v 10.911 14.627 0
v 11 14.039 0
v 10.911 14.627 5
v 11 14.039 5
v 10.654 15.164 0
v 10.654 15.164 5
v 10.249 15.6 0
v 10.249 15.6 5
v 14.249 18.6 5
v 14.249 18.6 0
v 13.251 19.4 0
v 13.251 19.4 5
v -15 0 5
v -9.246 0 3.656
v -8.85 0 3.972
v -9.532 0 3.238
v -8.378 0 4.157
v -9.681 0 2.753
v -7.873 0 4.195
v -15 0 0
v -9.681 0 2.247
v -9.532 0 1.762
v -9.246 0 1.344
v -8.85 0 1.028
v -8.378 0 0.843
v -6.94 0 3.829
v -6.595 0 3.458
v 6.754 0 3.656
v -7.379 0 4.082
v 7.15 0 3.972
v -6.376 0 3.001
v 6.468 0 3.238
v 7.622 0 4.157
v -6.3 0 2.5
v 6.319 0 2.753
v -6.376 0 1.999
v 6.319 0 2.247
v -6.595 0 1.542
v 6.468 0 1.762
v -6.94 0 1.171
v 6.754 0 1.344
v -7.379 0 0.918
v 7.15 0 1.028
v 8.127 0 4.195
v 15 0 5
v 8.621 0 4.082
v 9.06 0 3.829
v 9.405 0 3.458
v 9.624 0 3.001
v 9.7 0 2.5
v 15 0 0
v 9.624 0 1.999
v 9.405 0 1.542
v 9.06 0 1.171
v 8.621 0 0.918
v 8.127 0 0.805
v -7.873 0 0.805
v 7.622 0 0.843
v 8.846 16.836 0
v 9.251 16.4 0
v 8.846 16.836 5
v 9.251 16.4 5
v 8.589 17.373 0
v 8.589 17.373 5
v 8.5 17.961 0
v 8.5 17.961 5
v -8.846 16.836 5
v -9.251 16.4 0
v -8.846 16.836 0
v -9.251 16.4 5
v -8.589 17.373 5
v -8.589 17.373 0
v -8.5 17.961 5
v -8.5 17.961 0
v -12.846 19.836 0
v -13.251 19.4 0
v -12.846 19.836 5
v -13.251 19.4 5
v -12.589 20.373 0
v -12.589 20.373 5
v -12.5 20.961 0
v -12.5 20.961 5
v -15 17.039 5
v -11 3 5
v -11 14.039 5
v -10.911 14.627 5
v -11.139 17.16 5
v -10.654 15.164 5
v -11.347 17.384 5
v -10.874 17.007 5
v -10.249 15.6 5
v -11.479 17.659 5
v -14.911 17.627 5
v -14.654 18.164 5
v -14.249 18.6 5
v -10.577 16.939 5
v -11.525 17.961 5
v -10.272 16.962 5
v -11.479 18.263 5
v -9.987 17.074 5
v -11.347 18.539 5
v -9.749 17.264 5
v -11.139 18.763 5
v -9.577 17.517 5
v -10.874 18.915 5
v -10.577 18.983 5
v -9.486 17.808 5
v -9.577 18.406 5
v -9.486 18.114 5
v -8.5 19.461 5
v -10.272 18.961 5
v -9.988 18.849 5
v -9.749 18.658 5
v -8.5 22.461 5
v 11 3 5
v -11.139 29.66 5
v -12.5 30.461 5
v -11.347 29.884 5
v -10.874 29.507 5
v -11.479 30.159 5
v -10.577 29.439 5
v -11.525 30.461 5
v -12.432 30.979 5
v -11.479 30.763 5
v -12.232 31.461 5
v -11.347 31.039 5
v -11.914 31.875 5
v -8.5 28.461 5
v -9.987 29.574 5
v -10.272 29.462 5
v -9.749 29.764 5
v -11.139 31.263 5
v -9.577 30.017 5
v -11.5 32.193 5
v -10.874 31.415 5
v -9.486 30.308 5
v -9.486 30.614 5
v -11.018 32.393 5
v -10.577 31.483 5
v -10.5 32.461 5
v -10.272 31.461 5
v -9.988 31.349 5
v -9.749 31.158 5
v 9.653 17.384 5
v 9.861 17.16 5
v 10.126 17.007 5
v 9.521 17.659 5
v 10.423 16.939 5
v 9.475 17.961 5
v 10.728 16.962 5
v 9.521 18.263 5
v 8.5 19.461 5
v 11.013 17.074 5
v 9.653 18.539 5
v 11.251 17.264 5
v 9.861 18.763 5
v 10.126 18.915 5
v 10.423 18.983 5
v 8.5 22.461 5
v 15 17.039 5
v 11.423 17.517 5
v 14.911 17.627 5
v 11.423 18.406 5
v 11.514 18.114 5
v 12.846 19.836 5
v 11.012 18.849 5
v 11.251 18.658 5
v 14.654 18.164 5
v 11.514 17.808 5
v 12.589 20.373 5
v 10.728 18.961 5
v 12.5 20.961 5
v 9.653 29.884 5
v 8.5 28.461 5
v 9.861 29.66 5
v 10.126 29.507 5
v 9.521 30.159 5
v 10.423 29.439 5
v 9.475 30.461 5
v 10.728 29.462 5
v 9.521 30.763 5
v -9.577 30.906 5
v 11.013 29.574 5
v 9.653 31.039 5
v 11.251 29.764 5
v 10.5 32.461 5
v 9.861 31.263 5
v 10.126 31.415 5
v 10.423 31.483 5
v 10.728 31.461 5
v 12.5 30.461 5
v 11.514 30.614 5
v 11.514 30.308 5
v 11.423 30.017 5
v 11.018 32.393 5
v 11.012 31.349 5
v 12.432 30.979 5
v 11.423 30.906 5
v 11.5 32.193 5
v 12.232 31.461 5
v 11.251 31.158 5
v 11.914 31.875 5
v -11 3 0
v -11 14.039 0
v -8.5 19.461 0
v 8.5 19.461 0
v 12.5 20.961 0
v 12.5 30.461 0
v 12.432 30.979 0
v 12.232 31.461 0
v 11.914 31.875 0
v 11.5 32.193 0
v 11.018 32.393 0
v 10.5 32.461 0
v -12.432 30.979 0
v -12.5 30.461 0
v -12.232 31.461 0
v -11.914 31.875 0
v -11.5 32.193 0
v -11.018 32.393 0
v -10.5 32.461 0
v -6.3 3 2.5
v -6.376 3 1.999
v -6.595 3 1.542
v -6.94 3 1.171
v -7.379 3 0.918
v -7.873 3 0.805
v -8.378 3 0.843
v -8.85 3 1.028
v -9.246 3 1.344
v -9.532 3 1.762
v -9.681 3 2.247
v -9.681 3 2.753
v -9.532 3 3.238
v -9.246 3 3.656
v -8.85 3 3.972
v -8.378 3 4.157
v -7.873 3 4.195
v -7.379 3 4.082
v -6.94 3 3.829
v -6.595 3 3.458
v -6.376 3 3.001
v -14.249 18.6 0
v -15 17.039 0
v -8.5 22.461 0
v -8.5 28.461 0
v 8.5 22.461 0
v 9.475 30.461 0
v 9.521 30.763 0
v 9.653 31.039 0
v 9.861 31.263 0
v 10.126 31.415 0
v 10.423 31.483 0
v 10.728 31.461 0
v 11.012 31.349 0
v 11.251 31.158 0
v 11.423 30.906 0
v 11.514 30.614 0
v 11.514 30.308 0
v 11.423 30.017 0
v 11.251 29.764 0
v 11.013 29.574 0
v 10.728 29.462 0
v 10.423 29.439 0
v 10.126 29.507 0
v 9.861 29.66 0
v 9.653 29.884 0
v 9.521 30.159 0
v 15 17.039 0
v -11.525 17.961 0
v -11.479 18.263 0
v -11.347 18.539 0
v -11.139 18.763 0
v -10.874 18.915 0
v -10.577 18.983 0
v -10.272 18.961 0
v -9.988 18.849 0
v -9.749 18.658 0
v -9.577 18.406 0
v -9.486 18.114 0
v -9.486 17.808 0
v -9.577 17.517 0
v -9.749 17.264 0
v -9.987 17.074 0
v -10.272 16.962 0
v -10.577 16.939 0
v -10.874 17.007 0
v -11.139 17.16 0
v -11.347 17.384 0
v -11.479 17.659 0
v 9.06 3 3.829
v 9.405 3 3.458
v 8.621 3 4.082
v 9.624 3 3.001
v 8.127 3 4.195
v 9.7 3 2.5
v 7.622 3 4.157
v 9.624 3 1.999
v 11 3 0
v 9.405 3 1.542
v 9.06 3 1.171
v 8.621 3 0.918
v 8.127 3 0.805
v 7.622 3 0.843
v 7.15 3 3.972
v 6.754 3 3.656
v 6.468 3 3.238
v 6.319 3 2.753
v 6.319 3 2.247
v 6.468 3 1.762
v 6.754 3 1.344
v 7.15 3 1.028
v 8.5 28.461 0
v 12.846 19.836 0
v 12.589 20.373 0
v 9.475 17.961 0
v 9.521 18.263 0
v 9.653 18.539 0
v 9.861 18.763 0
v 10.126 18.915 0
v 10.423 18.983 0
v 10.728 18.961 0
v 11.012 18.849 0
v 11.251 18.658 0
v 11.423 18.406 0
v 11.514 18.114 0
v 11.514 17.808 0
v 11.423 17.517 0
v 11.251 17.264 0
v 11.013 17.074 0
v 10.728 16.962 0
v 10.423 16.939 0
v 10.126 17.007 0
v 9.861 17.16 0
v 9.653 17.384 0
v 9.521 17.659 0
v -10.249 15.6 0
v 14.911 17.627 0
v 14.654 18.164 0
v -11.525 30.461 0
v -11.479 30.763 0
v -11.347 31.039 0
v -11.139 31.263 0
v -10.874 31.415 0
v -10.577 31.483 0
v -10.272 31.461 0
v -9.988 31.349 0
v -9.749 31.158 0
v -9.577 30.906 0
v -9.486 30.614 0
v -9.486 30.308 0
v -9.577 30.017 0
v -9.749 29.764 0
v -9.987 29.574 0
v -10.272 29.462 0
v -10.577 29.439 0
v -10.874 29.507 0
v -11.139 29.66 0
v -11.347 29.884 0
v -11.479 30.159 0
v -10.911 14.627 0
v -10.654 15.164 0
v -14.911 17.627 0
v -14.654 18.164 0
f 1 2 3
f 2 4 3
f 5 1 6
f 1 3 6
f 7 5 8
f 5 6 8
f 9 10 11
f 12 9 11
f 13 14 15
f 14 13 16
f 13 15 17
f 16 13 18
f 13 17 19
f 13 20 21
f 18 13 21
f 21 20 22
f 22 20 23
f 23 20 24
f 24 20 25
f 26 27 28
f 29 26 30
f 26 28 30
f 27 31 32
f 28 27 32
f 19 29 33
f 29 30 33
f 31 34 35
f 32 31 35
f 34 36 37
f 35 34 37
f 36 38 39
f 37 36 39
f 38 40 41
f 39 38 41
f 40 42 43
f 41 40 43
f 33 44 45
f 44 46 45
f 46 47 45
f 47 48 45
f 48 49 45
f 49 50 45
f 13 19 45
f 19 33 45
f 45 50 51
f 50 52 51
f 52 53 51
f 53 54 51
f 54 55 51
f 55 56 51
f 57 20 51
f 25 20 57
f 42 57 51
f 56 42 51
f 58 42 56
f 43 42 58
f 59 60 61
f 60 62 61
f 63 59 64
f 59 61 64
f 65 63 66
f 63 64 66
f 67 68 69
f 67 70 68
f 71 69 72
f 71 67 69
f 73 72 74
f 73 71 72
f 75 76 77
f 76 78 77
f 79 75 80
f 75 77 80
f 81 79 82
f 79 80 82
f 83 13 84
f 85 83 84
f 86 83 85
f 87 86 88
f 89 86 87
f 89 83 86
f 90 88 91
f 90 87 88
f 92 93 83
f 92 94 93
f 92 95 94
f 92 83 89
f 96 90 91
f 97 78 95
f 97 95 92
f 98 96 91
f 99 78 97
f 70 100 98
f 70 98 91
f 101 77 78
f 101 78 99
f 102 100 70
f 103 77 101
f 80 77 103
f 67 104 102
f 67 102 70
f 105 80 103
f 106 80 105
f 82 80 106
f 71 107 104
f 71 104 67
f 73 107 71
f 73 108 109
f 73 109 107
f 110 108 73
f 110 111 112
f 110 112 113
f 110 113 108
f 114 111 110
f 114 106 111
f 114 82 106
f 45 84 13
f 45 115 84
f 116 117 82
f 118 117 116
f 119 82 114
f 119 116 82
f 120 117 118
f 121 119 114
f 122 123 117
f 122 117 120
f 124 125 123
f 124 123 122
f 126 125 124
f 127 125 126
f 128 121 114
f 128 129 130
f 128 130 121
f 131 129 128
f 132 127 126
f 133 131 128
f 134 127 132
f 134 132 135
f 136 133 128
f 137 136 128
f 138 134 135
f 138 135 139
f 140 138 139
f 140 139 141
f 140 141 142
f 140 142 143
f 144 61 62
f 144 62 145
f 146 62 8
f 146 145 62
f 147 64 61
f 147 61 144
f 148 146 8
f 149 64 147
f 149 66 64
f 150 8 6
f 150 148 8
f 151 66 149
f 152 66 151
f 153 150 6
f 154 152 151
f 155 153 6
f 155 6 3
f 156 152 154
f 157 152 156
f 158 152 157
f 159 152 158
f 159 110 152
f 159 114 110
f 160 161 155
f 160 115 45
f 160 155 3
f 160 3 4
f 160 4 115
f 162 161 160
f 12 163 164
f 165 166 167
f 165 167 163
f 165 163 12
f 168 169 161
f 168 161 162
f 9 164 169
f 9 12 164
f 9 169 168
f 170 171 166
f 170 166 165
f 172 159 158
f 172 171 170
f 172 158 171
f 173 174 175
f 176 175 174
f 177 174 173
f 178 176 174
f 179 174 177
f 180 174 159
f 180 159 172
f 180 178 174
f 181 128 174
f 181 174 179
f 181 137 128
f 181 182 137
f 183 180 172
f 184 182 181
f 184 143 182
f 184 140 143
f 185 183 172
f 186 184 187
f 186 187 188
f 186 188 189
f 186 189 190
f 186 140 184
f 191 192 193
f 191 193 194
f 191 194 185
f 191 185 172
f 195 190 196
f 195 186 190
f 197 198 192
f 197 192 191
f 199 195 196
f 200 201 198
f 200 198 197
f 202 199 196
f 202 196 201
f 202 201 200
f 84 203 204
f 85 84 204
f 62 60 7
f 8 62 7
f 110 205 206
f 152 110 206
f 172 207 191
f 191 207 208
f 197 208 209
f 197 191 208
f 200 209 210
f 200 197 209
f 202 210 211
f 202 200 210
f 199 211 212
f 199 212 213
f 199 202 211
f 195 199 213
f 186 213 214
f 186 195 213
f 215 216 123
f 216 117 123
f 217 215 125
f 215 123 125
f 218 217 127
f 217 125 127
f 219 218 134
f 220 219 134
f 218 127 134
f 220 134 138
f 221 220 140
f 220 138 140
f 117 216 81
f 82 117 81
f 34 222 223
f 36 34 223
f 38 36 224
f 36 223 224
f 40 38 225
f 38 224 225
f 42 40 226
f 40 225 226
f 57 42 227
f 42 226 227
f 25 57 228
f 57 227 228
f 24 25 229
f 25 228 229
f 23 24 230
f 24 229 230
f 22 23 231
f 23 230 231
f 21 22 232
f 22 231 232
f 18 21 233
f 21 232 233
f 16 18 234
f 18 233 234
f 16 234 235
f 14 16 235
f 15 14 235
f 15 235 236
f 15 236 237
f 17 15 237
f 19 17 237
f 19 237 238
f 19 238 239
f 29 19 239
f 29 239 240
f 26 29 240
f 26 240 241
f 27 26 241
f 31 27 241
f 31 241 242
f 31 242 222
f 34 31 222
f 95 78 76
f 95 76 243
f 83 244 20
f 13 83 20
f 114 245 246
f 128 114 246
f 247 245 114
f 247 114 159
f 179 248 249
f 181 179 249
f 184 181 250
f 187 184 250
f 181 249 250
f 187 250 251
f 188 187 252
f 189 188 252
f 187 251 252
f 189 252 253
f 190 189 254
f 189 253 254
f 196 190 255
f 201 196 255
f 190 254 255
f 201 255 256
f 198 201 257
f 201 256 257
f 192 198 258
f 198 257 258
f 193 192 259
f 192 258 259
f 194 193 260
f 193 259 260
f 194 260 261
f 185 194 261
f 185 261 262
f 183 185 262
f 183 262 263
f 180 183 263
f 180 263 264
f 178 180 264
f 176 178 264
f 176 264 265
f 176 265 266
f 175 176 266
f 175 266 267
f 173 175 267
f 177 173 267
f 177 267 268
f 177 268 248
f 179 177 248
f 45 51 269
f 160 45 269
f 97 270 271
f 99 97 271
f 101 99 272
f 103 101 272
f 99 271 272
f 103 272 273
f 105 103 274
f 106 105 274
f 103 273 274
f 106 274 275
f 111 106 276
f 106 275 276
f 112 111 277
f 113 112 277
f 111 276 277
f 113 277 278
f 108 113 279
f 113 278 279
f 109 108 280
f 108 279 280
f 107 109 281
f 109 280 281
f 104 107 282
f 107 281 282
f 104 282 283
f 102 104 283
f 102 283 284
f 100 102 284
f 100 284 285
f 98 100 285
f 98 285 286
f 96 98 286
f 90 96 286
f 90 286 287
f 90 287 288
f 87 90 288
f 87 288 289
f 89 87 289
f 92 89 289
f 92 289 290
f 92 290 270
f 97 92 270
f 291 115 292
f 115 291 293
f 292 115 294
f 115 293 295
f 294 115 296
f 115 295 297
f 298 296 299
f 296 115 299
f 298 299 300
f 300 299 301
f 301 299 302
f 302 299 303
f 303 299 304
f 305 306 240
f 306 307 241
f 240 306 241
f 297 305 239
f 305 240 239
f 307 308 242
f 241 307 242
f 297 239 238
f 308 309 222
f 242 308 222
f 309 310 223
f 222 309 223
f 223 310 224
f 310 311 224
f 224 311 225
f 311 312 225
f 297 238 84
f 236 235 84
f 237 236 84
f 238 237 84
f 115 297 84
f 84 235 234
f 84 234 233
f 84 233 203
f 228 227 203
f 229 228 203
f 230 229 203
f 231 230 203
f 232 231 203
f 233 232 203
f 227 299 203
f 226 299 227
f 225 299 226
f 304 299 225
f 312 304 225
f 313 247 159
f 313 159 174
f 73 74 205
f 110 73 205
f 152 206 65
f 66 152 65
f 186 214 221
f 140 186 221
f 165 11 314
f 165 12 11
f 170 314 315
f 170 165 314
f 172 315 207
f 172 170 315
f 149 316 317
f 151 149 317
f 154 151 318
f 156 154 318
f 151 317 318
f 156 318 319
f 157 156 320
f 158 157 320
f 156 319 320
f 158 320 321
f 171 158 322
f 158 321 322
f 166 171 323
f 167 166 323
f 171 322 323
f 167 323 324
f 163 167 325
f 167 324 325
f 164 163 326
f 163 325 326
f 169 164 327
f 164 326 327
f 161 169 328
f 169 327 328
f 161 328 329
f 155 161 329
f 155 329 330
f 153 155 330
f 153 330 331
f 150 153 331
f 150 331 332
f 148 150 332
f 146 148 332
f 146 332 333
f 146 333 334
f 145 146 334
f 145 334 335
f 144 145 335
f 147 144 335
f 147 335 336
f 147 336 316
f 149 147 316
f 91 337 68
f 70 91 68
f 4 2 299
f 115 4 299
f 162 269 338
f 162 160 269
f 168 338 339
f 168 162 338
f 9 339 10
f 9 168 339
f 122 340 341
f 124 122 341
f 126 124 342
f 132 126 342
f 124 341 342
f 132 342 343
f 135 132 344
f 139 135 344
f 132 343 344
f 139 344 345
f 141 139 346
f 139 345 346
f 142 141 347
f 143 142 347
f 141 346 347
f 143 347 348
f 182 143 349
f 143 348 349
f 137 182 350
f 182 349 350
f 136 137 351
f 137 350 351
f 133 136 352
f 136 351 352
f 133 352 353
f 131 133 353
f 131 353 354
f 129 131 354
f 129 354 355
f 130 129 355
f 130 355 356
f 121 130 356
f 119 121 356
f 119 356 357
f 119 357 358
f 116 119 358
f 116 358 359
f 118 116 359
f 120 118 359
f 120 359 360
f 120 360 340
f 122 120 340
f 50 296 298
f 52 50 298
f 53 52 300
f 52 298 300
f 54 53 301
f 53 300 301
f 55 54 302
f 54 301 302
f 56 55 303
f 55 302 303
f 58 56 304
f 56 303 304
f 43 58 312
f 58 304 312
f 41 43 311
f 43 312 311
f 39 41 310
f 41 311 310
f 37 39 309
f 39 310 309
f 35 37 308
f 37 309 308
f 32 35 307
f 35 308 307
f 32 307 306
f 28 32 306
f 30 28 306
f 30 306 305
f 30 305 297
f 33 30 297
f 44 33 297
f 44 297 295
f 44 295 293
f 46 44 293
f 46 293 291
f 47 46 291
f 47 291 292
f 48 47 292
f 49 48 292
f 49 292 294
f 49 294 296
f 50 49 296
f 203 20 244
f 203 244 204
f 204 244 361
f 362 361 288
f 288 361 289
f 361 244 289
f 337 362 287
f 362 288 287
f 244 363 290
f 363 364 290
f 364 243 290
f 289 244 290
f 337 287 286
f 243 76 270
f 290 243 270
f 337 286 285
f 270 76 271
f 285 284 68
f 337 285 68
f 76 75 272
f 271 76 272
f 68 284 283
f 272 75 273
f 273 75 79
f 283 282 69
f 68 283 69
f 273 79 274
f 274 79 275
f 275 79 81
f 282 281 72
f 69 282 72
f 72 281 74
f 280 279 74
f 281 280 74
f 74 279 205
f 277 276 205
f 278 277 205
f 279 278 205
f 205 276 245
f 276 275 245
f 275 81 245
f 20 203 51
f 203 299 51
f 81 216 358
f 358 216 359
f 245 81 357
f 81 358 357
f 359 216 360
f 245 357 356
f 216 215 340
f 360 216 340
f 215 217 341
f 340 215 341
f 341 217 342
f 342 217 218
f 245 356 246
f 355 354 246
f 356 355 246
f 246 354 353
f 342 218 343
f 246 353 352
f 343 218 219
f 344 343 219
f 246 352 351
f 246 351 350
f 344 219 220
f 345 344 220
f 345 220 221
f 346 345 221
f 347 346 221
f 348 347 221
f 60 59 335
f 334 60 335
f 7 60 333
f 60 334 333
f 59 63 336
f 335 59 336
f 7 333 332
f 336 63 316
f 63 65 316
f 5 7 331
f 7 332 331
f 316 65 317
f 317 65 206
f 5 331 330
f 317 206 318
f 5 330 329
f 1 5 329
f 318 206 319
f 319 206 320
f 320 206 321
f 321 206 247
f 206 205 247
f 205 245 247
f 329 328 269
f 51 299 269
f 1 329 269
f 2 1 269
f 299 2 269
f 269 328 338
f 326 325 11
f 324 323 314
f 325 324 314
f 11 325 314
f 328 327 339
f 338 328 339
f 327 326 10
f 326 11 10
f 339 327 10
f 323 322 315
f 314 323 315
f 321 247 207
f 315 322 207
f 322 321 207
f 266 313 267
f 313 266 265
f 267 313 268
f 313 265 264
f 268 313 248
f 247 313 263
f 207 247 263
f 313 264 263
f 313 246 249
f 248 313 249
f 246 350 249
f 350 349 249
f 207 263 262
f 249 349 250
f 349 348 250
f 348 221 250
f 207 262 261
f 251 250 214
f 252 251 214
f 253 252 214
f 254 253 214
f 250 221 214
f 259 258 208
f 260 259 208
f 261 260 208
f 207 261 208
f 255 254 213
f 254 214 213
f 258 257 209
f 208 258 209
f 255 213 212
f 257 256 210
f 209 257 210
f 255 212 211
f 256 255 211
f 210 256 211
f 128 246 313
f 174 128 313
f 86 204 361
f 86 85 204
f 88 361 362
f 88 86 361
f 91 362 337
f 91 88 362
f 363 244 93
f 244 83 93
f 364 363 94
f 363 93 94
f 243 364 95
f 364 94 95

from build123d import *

# Parameters (mm, degrees)
SKETCH1_R                = 0.25
SKETCH1_W                = 17
SKETCH1_H                = 6
BOSS_EXTRUDE1_DEPTH      = 5
FILLET1_R                = 2
M2_5X0_45_TAPPED_HOLE1_D = 2.05
M3_CLEARANCE_HOLE1_D     = 3.4
M3_CLEARANCE_HOLE1_DEPTH = 3


with BuildPart() as part:
    # Sketch1 → Boss-Extrude1 (new body)
    with BuildSketch(Plane.XY):
        Polygon((-15, 0), (15, 0), (15, 18), (12.5, 20), (12.5, 32.461249695), (-12.5, 32.461249695), (-12.5, 20), (-15, 18), align=None)
        with Locations((-10.5, 30.461249695)):
            Circle(SKETCH1_R, mode=Mode.SUBTRACT)
        with Locations((-10.5, 17.961249695)):
            Circle(SKETCH1_R, mode=Mode.SUBTRACT)
        with Locations((10.5, 30.461249695)):
            Circle(SKETCH1_R, mode=Mode.SUBTRACT)
        with Locations((10.5, 17.961249695)):
            Circle(SKETCH1_R, mode=Mode.SUBTRACT)
        Polygon((-11, 15), (-8.5, 17), (-8.5, 19.461249695), (8.5, 19.461249695), (8.5, 17), (11, 15), (11, 3), (-11, 3), align=None, mode=Mode.SUBTRACT)
        with Locations((0, 25.461249695)):
            Rectangle(SKETCH1_W, SKETCH1_H, mode=Mode.SUBTRACT)
    extrude(amount=BOSS_EXTRUDE1_DEPTH)

    # Fillet1
    fillet1_edges = [part.edges().sort_by_distance(p)[0] for p in [
        (-15, 18, 2.5),
        (-12.5, 20, 2.5),
        (-12.5, 32.461249695, 2.5),
        (12.5, 32.461249695, 2.5),
        (12.5, 20, 2.5),
        (15, 18, 2.5),
        (-11, 15, 2.5),
        (11, 15, 2.5),
        (8.5, 17, 2.5),
        (-8.5, 17, 2.5),
    ]]
    fillet(fillet1_edges, radius=FILLET1_R)

    # M2.5x0.45 Tapped Hole1 (through all)
    with Locations(Plane.XY.offset(5)):
        with Locations((-10.5, 17.961249695), (10.5, 30.461249695), (10.5, 17.961249695), (-10.5, 30.461249695)):
            Hole(M2_5X0_45_TAPPED_HOLE1_D / 2)

    # M3 Clearance Hole1
    with Locations(Plane(origin=(0, 0, 0), x_dir=(-1, 0, 0), z_dir=(0, -1, 0))):
        with Locations((8, -2.5), (-8, -2.5)):
            Hole(M3_CLEARANCE_HOLE1_D / 2, depth=M3_CLEARANCE_HOLE1_DEPTH)


solid = part.part
